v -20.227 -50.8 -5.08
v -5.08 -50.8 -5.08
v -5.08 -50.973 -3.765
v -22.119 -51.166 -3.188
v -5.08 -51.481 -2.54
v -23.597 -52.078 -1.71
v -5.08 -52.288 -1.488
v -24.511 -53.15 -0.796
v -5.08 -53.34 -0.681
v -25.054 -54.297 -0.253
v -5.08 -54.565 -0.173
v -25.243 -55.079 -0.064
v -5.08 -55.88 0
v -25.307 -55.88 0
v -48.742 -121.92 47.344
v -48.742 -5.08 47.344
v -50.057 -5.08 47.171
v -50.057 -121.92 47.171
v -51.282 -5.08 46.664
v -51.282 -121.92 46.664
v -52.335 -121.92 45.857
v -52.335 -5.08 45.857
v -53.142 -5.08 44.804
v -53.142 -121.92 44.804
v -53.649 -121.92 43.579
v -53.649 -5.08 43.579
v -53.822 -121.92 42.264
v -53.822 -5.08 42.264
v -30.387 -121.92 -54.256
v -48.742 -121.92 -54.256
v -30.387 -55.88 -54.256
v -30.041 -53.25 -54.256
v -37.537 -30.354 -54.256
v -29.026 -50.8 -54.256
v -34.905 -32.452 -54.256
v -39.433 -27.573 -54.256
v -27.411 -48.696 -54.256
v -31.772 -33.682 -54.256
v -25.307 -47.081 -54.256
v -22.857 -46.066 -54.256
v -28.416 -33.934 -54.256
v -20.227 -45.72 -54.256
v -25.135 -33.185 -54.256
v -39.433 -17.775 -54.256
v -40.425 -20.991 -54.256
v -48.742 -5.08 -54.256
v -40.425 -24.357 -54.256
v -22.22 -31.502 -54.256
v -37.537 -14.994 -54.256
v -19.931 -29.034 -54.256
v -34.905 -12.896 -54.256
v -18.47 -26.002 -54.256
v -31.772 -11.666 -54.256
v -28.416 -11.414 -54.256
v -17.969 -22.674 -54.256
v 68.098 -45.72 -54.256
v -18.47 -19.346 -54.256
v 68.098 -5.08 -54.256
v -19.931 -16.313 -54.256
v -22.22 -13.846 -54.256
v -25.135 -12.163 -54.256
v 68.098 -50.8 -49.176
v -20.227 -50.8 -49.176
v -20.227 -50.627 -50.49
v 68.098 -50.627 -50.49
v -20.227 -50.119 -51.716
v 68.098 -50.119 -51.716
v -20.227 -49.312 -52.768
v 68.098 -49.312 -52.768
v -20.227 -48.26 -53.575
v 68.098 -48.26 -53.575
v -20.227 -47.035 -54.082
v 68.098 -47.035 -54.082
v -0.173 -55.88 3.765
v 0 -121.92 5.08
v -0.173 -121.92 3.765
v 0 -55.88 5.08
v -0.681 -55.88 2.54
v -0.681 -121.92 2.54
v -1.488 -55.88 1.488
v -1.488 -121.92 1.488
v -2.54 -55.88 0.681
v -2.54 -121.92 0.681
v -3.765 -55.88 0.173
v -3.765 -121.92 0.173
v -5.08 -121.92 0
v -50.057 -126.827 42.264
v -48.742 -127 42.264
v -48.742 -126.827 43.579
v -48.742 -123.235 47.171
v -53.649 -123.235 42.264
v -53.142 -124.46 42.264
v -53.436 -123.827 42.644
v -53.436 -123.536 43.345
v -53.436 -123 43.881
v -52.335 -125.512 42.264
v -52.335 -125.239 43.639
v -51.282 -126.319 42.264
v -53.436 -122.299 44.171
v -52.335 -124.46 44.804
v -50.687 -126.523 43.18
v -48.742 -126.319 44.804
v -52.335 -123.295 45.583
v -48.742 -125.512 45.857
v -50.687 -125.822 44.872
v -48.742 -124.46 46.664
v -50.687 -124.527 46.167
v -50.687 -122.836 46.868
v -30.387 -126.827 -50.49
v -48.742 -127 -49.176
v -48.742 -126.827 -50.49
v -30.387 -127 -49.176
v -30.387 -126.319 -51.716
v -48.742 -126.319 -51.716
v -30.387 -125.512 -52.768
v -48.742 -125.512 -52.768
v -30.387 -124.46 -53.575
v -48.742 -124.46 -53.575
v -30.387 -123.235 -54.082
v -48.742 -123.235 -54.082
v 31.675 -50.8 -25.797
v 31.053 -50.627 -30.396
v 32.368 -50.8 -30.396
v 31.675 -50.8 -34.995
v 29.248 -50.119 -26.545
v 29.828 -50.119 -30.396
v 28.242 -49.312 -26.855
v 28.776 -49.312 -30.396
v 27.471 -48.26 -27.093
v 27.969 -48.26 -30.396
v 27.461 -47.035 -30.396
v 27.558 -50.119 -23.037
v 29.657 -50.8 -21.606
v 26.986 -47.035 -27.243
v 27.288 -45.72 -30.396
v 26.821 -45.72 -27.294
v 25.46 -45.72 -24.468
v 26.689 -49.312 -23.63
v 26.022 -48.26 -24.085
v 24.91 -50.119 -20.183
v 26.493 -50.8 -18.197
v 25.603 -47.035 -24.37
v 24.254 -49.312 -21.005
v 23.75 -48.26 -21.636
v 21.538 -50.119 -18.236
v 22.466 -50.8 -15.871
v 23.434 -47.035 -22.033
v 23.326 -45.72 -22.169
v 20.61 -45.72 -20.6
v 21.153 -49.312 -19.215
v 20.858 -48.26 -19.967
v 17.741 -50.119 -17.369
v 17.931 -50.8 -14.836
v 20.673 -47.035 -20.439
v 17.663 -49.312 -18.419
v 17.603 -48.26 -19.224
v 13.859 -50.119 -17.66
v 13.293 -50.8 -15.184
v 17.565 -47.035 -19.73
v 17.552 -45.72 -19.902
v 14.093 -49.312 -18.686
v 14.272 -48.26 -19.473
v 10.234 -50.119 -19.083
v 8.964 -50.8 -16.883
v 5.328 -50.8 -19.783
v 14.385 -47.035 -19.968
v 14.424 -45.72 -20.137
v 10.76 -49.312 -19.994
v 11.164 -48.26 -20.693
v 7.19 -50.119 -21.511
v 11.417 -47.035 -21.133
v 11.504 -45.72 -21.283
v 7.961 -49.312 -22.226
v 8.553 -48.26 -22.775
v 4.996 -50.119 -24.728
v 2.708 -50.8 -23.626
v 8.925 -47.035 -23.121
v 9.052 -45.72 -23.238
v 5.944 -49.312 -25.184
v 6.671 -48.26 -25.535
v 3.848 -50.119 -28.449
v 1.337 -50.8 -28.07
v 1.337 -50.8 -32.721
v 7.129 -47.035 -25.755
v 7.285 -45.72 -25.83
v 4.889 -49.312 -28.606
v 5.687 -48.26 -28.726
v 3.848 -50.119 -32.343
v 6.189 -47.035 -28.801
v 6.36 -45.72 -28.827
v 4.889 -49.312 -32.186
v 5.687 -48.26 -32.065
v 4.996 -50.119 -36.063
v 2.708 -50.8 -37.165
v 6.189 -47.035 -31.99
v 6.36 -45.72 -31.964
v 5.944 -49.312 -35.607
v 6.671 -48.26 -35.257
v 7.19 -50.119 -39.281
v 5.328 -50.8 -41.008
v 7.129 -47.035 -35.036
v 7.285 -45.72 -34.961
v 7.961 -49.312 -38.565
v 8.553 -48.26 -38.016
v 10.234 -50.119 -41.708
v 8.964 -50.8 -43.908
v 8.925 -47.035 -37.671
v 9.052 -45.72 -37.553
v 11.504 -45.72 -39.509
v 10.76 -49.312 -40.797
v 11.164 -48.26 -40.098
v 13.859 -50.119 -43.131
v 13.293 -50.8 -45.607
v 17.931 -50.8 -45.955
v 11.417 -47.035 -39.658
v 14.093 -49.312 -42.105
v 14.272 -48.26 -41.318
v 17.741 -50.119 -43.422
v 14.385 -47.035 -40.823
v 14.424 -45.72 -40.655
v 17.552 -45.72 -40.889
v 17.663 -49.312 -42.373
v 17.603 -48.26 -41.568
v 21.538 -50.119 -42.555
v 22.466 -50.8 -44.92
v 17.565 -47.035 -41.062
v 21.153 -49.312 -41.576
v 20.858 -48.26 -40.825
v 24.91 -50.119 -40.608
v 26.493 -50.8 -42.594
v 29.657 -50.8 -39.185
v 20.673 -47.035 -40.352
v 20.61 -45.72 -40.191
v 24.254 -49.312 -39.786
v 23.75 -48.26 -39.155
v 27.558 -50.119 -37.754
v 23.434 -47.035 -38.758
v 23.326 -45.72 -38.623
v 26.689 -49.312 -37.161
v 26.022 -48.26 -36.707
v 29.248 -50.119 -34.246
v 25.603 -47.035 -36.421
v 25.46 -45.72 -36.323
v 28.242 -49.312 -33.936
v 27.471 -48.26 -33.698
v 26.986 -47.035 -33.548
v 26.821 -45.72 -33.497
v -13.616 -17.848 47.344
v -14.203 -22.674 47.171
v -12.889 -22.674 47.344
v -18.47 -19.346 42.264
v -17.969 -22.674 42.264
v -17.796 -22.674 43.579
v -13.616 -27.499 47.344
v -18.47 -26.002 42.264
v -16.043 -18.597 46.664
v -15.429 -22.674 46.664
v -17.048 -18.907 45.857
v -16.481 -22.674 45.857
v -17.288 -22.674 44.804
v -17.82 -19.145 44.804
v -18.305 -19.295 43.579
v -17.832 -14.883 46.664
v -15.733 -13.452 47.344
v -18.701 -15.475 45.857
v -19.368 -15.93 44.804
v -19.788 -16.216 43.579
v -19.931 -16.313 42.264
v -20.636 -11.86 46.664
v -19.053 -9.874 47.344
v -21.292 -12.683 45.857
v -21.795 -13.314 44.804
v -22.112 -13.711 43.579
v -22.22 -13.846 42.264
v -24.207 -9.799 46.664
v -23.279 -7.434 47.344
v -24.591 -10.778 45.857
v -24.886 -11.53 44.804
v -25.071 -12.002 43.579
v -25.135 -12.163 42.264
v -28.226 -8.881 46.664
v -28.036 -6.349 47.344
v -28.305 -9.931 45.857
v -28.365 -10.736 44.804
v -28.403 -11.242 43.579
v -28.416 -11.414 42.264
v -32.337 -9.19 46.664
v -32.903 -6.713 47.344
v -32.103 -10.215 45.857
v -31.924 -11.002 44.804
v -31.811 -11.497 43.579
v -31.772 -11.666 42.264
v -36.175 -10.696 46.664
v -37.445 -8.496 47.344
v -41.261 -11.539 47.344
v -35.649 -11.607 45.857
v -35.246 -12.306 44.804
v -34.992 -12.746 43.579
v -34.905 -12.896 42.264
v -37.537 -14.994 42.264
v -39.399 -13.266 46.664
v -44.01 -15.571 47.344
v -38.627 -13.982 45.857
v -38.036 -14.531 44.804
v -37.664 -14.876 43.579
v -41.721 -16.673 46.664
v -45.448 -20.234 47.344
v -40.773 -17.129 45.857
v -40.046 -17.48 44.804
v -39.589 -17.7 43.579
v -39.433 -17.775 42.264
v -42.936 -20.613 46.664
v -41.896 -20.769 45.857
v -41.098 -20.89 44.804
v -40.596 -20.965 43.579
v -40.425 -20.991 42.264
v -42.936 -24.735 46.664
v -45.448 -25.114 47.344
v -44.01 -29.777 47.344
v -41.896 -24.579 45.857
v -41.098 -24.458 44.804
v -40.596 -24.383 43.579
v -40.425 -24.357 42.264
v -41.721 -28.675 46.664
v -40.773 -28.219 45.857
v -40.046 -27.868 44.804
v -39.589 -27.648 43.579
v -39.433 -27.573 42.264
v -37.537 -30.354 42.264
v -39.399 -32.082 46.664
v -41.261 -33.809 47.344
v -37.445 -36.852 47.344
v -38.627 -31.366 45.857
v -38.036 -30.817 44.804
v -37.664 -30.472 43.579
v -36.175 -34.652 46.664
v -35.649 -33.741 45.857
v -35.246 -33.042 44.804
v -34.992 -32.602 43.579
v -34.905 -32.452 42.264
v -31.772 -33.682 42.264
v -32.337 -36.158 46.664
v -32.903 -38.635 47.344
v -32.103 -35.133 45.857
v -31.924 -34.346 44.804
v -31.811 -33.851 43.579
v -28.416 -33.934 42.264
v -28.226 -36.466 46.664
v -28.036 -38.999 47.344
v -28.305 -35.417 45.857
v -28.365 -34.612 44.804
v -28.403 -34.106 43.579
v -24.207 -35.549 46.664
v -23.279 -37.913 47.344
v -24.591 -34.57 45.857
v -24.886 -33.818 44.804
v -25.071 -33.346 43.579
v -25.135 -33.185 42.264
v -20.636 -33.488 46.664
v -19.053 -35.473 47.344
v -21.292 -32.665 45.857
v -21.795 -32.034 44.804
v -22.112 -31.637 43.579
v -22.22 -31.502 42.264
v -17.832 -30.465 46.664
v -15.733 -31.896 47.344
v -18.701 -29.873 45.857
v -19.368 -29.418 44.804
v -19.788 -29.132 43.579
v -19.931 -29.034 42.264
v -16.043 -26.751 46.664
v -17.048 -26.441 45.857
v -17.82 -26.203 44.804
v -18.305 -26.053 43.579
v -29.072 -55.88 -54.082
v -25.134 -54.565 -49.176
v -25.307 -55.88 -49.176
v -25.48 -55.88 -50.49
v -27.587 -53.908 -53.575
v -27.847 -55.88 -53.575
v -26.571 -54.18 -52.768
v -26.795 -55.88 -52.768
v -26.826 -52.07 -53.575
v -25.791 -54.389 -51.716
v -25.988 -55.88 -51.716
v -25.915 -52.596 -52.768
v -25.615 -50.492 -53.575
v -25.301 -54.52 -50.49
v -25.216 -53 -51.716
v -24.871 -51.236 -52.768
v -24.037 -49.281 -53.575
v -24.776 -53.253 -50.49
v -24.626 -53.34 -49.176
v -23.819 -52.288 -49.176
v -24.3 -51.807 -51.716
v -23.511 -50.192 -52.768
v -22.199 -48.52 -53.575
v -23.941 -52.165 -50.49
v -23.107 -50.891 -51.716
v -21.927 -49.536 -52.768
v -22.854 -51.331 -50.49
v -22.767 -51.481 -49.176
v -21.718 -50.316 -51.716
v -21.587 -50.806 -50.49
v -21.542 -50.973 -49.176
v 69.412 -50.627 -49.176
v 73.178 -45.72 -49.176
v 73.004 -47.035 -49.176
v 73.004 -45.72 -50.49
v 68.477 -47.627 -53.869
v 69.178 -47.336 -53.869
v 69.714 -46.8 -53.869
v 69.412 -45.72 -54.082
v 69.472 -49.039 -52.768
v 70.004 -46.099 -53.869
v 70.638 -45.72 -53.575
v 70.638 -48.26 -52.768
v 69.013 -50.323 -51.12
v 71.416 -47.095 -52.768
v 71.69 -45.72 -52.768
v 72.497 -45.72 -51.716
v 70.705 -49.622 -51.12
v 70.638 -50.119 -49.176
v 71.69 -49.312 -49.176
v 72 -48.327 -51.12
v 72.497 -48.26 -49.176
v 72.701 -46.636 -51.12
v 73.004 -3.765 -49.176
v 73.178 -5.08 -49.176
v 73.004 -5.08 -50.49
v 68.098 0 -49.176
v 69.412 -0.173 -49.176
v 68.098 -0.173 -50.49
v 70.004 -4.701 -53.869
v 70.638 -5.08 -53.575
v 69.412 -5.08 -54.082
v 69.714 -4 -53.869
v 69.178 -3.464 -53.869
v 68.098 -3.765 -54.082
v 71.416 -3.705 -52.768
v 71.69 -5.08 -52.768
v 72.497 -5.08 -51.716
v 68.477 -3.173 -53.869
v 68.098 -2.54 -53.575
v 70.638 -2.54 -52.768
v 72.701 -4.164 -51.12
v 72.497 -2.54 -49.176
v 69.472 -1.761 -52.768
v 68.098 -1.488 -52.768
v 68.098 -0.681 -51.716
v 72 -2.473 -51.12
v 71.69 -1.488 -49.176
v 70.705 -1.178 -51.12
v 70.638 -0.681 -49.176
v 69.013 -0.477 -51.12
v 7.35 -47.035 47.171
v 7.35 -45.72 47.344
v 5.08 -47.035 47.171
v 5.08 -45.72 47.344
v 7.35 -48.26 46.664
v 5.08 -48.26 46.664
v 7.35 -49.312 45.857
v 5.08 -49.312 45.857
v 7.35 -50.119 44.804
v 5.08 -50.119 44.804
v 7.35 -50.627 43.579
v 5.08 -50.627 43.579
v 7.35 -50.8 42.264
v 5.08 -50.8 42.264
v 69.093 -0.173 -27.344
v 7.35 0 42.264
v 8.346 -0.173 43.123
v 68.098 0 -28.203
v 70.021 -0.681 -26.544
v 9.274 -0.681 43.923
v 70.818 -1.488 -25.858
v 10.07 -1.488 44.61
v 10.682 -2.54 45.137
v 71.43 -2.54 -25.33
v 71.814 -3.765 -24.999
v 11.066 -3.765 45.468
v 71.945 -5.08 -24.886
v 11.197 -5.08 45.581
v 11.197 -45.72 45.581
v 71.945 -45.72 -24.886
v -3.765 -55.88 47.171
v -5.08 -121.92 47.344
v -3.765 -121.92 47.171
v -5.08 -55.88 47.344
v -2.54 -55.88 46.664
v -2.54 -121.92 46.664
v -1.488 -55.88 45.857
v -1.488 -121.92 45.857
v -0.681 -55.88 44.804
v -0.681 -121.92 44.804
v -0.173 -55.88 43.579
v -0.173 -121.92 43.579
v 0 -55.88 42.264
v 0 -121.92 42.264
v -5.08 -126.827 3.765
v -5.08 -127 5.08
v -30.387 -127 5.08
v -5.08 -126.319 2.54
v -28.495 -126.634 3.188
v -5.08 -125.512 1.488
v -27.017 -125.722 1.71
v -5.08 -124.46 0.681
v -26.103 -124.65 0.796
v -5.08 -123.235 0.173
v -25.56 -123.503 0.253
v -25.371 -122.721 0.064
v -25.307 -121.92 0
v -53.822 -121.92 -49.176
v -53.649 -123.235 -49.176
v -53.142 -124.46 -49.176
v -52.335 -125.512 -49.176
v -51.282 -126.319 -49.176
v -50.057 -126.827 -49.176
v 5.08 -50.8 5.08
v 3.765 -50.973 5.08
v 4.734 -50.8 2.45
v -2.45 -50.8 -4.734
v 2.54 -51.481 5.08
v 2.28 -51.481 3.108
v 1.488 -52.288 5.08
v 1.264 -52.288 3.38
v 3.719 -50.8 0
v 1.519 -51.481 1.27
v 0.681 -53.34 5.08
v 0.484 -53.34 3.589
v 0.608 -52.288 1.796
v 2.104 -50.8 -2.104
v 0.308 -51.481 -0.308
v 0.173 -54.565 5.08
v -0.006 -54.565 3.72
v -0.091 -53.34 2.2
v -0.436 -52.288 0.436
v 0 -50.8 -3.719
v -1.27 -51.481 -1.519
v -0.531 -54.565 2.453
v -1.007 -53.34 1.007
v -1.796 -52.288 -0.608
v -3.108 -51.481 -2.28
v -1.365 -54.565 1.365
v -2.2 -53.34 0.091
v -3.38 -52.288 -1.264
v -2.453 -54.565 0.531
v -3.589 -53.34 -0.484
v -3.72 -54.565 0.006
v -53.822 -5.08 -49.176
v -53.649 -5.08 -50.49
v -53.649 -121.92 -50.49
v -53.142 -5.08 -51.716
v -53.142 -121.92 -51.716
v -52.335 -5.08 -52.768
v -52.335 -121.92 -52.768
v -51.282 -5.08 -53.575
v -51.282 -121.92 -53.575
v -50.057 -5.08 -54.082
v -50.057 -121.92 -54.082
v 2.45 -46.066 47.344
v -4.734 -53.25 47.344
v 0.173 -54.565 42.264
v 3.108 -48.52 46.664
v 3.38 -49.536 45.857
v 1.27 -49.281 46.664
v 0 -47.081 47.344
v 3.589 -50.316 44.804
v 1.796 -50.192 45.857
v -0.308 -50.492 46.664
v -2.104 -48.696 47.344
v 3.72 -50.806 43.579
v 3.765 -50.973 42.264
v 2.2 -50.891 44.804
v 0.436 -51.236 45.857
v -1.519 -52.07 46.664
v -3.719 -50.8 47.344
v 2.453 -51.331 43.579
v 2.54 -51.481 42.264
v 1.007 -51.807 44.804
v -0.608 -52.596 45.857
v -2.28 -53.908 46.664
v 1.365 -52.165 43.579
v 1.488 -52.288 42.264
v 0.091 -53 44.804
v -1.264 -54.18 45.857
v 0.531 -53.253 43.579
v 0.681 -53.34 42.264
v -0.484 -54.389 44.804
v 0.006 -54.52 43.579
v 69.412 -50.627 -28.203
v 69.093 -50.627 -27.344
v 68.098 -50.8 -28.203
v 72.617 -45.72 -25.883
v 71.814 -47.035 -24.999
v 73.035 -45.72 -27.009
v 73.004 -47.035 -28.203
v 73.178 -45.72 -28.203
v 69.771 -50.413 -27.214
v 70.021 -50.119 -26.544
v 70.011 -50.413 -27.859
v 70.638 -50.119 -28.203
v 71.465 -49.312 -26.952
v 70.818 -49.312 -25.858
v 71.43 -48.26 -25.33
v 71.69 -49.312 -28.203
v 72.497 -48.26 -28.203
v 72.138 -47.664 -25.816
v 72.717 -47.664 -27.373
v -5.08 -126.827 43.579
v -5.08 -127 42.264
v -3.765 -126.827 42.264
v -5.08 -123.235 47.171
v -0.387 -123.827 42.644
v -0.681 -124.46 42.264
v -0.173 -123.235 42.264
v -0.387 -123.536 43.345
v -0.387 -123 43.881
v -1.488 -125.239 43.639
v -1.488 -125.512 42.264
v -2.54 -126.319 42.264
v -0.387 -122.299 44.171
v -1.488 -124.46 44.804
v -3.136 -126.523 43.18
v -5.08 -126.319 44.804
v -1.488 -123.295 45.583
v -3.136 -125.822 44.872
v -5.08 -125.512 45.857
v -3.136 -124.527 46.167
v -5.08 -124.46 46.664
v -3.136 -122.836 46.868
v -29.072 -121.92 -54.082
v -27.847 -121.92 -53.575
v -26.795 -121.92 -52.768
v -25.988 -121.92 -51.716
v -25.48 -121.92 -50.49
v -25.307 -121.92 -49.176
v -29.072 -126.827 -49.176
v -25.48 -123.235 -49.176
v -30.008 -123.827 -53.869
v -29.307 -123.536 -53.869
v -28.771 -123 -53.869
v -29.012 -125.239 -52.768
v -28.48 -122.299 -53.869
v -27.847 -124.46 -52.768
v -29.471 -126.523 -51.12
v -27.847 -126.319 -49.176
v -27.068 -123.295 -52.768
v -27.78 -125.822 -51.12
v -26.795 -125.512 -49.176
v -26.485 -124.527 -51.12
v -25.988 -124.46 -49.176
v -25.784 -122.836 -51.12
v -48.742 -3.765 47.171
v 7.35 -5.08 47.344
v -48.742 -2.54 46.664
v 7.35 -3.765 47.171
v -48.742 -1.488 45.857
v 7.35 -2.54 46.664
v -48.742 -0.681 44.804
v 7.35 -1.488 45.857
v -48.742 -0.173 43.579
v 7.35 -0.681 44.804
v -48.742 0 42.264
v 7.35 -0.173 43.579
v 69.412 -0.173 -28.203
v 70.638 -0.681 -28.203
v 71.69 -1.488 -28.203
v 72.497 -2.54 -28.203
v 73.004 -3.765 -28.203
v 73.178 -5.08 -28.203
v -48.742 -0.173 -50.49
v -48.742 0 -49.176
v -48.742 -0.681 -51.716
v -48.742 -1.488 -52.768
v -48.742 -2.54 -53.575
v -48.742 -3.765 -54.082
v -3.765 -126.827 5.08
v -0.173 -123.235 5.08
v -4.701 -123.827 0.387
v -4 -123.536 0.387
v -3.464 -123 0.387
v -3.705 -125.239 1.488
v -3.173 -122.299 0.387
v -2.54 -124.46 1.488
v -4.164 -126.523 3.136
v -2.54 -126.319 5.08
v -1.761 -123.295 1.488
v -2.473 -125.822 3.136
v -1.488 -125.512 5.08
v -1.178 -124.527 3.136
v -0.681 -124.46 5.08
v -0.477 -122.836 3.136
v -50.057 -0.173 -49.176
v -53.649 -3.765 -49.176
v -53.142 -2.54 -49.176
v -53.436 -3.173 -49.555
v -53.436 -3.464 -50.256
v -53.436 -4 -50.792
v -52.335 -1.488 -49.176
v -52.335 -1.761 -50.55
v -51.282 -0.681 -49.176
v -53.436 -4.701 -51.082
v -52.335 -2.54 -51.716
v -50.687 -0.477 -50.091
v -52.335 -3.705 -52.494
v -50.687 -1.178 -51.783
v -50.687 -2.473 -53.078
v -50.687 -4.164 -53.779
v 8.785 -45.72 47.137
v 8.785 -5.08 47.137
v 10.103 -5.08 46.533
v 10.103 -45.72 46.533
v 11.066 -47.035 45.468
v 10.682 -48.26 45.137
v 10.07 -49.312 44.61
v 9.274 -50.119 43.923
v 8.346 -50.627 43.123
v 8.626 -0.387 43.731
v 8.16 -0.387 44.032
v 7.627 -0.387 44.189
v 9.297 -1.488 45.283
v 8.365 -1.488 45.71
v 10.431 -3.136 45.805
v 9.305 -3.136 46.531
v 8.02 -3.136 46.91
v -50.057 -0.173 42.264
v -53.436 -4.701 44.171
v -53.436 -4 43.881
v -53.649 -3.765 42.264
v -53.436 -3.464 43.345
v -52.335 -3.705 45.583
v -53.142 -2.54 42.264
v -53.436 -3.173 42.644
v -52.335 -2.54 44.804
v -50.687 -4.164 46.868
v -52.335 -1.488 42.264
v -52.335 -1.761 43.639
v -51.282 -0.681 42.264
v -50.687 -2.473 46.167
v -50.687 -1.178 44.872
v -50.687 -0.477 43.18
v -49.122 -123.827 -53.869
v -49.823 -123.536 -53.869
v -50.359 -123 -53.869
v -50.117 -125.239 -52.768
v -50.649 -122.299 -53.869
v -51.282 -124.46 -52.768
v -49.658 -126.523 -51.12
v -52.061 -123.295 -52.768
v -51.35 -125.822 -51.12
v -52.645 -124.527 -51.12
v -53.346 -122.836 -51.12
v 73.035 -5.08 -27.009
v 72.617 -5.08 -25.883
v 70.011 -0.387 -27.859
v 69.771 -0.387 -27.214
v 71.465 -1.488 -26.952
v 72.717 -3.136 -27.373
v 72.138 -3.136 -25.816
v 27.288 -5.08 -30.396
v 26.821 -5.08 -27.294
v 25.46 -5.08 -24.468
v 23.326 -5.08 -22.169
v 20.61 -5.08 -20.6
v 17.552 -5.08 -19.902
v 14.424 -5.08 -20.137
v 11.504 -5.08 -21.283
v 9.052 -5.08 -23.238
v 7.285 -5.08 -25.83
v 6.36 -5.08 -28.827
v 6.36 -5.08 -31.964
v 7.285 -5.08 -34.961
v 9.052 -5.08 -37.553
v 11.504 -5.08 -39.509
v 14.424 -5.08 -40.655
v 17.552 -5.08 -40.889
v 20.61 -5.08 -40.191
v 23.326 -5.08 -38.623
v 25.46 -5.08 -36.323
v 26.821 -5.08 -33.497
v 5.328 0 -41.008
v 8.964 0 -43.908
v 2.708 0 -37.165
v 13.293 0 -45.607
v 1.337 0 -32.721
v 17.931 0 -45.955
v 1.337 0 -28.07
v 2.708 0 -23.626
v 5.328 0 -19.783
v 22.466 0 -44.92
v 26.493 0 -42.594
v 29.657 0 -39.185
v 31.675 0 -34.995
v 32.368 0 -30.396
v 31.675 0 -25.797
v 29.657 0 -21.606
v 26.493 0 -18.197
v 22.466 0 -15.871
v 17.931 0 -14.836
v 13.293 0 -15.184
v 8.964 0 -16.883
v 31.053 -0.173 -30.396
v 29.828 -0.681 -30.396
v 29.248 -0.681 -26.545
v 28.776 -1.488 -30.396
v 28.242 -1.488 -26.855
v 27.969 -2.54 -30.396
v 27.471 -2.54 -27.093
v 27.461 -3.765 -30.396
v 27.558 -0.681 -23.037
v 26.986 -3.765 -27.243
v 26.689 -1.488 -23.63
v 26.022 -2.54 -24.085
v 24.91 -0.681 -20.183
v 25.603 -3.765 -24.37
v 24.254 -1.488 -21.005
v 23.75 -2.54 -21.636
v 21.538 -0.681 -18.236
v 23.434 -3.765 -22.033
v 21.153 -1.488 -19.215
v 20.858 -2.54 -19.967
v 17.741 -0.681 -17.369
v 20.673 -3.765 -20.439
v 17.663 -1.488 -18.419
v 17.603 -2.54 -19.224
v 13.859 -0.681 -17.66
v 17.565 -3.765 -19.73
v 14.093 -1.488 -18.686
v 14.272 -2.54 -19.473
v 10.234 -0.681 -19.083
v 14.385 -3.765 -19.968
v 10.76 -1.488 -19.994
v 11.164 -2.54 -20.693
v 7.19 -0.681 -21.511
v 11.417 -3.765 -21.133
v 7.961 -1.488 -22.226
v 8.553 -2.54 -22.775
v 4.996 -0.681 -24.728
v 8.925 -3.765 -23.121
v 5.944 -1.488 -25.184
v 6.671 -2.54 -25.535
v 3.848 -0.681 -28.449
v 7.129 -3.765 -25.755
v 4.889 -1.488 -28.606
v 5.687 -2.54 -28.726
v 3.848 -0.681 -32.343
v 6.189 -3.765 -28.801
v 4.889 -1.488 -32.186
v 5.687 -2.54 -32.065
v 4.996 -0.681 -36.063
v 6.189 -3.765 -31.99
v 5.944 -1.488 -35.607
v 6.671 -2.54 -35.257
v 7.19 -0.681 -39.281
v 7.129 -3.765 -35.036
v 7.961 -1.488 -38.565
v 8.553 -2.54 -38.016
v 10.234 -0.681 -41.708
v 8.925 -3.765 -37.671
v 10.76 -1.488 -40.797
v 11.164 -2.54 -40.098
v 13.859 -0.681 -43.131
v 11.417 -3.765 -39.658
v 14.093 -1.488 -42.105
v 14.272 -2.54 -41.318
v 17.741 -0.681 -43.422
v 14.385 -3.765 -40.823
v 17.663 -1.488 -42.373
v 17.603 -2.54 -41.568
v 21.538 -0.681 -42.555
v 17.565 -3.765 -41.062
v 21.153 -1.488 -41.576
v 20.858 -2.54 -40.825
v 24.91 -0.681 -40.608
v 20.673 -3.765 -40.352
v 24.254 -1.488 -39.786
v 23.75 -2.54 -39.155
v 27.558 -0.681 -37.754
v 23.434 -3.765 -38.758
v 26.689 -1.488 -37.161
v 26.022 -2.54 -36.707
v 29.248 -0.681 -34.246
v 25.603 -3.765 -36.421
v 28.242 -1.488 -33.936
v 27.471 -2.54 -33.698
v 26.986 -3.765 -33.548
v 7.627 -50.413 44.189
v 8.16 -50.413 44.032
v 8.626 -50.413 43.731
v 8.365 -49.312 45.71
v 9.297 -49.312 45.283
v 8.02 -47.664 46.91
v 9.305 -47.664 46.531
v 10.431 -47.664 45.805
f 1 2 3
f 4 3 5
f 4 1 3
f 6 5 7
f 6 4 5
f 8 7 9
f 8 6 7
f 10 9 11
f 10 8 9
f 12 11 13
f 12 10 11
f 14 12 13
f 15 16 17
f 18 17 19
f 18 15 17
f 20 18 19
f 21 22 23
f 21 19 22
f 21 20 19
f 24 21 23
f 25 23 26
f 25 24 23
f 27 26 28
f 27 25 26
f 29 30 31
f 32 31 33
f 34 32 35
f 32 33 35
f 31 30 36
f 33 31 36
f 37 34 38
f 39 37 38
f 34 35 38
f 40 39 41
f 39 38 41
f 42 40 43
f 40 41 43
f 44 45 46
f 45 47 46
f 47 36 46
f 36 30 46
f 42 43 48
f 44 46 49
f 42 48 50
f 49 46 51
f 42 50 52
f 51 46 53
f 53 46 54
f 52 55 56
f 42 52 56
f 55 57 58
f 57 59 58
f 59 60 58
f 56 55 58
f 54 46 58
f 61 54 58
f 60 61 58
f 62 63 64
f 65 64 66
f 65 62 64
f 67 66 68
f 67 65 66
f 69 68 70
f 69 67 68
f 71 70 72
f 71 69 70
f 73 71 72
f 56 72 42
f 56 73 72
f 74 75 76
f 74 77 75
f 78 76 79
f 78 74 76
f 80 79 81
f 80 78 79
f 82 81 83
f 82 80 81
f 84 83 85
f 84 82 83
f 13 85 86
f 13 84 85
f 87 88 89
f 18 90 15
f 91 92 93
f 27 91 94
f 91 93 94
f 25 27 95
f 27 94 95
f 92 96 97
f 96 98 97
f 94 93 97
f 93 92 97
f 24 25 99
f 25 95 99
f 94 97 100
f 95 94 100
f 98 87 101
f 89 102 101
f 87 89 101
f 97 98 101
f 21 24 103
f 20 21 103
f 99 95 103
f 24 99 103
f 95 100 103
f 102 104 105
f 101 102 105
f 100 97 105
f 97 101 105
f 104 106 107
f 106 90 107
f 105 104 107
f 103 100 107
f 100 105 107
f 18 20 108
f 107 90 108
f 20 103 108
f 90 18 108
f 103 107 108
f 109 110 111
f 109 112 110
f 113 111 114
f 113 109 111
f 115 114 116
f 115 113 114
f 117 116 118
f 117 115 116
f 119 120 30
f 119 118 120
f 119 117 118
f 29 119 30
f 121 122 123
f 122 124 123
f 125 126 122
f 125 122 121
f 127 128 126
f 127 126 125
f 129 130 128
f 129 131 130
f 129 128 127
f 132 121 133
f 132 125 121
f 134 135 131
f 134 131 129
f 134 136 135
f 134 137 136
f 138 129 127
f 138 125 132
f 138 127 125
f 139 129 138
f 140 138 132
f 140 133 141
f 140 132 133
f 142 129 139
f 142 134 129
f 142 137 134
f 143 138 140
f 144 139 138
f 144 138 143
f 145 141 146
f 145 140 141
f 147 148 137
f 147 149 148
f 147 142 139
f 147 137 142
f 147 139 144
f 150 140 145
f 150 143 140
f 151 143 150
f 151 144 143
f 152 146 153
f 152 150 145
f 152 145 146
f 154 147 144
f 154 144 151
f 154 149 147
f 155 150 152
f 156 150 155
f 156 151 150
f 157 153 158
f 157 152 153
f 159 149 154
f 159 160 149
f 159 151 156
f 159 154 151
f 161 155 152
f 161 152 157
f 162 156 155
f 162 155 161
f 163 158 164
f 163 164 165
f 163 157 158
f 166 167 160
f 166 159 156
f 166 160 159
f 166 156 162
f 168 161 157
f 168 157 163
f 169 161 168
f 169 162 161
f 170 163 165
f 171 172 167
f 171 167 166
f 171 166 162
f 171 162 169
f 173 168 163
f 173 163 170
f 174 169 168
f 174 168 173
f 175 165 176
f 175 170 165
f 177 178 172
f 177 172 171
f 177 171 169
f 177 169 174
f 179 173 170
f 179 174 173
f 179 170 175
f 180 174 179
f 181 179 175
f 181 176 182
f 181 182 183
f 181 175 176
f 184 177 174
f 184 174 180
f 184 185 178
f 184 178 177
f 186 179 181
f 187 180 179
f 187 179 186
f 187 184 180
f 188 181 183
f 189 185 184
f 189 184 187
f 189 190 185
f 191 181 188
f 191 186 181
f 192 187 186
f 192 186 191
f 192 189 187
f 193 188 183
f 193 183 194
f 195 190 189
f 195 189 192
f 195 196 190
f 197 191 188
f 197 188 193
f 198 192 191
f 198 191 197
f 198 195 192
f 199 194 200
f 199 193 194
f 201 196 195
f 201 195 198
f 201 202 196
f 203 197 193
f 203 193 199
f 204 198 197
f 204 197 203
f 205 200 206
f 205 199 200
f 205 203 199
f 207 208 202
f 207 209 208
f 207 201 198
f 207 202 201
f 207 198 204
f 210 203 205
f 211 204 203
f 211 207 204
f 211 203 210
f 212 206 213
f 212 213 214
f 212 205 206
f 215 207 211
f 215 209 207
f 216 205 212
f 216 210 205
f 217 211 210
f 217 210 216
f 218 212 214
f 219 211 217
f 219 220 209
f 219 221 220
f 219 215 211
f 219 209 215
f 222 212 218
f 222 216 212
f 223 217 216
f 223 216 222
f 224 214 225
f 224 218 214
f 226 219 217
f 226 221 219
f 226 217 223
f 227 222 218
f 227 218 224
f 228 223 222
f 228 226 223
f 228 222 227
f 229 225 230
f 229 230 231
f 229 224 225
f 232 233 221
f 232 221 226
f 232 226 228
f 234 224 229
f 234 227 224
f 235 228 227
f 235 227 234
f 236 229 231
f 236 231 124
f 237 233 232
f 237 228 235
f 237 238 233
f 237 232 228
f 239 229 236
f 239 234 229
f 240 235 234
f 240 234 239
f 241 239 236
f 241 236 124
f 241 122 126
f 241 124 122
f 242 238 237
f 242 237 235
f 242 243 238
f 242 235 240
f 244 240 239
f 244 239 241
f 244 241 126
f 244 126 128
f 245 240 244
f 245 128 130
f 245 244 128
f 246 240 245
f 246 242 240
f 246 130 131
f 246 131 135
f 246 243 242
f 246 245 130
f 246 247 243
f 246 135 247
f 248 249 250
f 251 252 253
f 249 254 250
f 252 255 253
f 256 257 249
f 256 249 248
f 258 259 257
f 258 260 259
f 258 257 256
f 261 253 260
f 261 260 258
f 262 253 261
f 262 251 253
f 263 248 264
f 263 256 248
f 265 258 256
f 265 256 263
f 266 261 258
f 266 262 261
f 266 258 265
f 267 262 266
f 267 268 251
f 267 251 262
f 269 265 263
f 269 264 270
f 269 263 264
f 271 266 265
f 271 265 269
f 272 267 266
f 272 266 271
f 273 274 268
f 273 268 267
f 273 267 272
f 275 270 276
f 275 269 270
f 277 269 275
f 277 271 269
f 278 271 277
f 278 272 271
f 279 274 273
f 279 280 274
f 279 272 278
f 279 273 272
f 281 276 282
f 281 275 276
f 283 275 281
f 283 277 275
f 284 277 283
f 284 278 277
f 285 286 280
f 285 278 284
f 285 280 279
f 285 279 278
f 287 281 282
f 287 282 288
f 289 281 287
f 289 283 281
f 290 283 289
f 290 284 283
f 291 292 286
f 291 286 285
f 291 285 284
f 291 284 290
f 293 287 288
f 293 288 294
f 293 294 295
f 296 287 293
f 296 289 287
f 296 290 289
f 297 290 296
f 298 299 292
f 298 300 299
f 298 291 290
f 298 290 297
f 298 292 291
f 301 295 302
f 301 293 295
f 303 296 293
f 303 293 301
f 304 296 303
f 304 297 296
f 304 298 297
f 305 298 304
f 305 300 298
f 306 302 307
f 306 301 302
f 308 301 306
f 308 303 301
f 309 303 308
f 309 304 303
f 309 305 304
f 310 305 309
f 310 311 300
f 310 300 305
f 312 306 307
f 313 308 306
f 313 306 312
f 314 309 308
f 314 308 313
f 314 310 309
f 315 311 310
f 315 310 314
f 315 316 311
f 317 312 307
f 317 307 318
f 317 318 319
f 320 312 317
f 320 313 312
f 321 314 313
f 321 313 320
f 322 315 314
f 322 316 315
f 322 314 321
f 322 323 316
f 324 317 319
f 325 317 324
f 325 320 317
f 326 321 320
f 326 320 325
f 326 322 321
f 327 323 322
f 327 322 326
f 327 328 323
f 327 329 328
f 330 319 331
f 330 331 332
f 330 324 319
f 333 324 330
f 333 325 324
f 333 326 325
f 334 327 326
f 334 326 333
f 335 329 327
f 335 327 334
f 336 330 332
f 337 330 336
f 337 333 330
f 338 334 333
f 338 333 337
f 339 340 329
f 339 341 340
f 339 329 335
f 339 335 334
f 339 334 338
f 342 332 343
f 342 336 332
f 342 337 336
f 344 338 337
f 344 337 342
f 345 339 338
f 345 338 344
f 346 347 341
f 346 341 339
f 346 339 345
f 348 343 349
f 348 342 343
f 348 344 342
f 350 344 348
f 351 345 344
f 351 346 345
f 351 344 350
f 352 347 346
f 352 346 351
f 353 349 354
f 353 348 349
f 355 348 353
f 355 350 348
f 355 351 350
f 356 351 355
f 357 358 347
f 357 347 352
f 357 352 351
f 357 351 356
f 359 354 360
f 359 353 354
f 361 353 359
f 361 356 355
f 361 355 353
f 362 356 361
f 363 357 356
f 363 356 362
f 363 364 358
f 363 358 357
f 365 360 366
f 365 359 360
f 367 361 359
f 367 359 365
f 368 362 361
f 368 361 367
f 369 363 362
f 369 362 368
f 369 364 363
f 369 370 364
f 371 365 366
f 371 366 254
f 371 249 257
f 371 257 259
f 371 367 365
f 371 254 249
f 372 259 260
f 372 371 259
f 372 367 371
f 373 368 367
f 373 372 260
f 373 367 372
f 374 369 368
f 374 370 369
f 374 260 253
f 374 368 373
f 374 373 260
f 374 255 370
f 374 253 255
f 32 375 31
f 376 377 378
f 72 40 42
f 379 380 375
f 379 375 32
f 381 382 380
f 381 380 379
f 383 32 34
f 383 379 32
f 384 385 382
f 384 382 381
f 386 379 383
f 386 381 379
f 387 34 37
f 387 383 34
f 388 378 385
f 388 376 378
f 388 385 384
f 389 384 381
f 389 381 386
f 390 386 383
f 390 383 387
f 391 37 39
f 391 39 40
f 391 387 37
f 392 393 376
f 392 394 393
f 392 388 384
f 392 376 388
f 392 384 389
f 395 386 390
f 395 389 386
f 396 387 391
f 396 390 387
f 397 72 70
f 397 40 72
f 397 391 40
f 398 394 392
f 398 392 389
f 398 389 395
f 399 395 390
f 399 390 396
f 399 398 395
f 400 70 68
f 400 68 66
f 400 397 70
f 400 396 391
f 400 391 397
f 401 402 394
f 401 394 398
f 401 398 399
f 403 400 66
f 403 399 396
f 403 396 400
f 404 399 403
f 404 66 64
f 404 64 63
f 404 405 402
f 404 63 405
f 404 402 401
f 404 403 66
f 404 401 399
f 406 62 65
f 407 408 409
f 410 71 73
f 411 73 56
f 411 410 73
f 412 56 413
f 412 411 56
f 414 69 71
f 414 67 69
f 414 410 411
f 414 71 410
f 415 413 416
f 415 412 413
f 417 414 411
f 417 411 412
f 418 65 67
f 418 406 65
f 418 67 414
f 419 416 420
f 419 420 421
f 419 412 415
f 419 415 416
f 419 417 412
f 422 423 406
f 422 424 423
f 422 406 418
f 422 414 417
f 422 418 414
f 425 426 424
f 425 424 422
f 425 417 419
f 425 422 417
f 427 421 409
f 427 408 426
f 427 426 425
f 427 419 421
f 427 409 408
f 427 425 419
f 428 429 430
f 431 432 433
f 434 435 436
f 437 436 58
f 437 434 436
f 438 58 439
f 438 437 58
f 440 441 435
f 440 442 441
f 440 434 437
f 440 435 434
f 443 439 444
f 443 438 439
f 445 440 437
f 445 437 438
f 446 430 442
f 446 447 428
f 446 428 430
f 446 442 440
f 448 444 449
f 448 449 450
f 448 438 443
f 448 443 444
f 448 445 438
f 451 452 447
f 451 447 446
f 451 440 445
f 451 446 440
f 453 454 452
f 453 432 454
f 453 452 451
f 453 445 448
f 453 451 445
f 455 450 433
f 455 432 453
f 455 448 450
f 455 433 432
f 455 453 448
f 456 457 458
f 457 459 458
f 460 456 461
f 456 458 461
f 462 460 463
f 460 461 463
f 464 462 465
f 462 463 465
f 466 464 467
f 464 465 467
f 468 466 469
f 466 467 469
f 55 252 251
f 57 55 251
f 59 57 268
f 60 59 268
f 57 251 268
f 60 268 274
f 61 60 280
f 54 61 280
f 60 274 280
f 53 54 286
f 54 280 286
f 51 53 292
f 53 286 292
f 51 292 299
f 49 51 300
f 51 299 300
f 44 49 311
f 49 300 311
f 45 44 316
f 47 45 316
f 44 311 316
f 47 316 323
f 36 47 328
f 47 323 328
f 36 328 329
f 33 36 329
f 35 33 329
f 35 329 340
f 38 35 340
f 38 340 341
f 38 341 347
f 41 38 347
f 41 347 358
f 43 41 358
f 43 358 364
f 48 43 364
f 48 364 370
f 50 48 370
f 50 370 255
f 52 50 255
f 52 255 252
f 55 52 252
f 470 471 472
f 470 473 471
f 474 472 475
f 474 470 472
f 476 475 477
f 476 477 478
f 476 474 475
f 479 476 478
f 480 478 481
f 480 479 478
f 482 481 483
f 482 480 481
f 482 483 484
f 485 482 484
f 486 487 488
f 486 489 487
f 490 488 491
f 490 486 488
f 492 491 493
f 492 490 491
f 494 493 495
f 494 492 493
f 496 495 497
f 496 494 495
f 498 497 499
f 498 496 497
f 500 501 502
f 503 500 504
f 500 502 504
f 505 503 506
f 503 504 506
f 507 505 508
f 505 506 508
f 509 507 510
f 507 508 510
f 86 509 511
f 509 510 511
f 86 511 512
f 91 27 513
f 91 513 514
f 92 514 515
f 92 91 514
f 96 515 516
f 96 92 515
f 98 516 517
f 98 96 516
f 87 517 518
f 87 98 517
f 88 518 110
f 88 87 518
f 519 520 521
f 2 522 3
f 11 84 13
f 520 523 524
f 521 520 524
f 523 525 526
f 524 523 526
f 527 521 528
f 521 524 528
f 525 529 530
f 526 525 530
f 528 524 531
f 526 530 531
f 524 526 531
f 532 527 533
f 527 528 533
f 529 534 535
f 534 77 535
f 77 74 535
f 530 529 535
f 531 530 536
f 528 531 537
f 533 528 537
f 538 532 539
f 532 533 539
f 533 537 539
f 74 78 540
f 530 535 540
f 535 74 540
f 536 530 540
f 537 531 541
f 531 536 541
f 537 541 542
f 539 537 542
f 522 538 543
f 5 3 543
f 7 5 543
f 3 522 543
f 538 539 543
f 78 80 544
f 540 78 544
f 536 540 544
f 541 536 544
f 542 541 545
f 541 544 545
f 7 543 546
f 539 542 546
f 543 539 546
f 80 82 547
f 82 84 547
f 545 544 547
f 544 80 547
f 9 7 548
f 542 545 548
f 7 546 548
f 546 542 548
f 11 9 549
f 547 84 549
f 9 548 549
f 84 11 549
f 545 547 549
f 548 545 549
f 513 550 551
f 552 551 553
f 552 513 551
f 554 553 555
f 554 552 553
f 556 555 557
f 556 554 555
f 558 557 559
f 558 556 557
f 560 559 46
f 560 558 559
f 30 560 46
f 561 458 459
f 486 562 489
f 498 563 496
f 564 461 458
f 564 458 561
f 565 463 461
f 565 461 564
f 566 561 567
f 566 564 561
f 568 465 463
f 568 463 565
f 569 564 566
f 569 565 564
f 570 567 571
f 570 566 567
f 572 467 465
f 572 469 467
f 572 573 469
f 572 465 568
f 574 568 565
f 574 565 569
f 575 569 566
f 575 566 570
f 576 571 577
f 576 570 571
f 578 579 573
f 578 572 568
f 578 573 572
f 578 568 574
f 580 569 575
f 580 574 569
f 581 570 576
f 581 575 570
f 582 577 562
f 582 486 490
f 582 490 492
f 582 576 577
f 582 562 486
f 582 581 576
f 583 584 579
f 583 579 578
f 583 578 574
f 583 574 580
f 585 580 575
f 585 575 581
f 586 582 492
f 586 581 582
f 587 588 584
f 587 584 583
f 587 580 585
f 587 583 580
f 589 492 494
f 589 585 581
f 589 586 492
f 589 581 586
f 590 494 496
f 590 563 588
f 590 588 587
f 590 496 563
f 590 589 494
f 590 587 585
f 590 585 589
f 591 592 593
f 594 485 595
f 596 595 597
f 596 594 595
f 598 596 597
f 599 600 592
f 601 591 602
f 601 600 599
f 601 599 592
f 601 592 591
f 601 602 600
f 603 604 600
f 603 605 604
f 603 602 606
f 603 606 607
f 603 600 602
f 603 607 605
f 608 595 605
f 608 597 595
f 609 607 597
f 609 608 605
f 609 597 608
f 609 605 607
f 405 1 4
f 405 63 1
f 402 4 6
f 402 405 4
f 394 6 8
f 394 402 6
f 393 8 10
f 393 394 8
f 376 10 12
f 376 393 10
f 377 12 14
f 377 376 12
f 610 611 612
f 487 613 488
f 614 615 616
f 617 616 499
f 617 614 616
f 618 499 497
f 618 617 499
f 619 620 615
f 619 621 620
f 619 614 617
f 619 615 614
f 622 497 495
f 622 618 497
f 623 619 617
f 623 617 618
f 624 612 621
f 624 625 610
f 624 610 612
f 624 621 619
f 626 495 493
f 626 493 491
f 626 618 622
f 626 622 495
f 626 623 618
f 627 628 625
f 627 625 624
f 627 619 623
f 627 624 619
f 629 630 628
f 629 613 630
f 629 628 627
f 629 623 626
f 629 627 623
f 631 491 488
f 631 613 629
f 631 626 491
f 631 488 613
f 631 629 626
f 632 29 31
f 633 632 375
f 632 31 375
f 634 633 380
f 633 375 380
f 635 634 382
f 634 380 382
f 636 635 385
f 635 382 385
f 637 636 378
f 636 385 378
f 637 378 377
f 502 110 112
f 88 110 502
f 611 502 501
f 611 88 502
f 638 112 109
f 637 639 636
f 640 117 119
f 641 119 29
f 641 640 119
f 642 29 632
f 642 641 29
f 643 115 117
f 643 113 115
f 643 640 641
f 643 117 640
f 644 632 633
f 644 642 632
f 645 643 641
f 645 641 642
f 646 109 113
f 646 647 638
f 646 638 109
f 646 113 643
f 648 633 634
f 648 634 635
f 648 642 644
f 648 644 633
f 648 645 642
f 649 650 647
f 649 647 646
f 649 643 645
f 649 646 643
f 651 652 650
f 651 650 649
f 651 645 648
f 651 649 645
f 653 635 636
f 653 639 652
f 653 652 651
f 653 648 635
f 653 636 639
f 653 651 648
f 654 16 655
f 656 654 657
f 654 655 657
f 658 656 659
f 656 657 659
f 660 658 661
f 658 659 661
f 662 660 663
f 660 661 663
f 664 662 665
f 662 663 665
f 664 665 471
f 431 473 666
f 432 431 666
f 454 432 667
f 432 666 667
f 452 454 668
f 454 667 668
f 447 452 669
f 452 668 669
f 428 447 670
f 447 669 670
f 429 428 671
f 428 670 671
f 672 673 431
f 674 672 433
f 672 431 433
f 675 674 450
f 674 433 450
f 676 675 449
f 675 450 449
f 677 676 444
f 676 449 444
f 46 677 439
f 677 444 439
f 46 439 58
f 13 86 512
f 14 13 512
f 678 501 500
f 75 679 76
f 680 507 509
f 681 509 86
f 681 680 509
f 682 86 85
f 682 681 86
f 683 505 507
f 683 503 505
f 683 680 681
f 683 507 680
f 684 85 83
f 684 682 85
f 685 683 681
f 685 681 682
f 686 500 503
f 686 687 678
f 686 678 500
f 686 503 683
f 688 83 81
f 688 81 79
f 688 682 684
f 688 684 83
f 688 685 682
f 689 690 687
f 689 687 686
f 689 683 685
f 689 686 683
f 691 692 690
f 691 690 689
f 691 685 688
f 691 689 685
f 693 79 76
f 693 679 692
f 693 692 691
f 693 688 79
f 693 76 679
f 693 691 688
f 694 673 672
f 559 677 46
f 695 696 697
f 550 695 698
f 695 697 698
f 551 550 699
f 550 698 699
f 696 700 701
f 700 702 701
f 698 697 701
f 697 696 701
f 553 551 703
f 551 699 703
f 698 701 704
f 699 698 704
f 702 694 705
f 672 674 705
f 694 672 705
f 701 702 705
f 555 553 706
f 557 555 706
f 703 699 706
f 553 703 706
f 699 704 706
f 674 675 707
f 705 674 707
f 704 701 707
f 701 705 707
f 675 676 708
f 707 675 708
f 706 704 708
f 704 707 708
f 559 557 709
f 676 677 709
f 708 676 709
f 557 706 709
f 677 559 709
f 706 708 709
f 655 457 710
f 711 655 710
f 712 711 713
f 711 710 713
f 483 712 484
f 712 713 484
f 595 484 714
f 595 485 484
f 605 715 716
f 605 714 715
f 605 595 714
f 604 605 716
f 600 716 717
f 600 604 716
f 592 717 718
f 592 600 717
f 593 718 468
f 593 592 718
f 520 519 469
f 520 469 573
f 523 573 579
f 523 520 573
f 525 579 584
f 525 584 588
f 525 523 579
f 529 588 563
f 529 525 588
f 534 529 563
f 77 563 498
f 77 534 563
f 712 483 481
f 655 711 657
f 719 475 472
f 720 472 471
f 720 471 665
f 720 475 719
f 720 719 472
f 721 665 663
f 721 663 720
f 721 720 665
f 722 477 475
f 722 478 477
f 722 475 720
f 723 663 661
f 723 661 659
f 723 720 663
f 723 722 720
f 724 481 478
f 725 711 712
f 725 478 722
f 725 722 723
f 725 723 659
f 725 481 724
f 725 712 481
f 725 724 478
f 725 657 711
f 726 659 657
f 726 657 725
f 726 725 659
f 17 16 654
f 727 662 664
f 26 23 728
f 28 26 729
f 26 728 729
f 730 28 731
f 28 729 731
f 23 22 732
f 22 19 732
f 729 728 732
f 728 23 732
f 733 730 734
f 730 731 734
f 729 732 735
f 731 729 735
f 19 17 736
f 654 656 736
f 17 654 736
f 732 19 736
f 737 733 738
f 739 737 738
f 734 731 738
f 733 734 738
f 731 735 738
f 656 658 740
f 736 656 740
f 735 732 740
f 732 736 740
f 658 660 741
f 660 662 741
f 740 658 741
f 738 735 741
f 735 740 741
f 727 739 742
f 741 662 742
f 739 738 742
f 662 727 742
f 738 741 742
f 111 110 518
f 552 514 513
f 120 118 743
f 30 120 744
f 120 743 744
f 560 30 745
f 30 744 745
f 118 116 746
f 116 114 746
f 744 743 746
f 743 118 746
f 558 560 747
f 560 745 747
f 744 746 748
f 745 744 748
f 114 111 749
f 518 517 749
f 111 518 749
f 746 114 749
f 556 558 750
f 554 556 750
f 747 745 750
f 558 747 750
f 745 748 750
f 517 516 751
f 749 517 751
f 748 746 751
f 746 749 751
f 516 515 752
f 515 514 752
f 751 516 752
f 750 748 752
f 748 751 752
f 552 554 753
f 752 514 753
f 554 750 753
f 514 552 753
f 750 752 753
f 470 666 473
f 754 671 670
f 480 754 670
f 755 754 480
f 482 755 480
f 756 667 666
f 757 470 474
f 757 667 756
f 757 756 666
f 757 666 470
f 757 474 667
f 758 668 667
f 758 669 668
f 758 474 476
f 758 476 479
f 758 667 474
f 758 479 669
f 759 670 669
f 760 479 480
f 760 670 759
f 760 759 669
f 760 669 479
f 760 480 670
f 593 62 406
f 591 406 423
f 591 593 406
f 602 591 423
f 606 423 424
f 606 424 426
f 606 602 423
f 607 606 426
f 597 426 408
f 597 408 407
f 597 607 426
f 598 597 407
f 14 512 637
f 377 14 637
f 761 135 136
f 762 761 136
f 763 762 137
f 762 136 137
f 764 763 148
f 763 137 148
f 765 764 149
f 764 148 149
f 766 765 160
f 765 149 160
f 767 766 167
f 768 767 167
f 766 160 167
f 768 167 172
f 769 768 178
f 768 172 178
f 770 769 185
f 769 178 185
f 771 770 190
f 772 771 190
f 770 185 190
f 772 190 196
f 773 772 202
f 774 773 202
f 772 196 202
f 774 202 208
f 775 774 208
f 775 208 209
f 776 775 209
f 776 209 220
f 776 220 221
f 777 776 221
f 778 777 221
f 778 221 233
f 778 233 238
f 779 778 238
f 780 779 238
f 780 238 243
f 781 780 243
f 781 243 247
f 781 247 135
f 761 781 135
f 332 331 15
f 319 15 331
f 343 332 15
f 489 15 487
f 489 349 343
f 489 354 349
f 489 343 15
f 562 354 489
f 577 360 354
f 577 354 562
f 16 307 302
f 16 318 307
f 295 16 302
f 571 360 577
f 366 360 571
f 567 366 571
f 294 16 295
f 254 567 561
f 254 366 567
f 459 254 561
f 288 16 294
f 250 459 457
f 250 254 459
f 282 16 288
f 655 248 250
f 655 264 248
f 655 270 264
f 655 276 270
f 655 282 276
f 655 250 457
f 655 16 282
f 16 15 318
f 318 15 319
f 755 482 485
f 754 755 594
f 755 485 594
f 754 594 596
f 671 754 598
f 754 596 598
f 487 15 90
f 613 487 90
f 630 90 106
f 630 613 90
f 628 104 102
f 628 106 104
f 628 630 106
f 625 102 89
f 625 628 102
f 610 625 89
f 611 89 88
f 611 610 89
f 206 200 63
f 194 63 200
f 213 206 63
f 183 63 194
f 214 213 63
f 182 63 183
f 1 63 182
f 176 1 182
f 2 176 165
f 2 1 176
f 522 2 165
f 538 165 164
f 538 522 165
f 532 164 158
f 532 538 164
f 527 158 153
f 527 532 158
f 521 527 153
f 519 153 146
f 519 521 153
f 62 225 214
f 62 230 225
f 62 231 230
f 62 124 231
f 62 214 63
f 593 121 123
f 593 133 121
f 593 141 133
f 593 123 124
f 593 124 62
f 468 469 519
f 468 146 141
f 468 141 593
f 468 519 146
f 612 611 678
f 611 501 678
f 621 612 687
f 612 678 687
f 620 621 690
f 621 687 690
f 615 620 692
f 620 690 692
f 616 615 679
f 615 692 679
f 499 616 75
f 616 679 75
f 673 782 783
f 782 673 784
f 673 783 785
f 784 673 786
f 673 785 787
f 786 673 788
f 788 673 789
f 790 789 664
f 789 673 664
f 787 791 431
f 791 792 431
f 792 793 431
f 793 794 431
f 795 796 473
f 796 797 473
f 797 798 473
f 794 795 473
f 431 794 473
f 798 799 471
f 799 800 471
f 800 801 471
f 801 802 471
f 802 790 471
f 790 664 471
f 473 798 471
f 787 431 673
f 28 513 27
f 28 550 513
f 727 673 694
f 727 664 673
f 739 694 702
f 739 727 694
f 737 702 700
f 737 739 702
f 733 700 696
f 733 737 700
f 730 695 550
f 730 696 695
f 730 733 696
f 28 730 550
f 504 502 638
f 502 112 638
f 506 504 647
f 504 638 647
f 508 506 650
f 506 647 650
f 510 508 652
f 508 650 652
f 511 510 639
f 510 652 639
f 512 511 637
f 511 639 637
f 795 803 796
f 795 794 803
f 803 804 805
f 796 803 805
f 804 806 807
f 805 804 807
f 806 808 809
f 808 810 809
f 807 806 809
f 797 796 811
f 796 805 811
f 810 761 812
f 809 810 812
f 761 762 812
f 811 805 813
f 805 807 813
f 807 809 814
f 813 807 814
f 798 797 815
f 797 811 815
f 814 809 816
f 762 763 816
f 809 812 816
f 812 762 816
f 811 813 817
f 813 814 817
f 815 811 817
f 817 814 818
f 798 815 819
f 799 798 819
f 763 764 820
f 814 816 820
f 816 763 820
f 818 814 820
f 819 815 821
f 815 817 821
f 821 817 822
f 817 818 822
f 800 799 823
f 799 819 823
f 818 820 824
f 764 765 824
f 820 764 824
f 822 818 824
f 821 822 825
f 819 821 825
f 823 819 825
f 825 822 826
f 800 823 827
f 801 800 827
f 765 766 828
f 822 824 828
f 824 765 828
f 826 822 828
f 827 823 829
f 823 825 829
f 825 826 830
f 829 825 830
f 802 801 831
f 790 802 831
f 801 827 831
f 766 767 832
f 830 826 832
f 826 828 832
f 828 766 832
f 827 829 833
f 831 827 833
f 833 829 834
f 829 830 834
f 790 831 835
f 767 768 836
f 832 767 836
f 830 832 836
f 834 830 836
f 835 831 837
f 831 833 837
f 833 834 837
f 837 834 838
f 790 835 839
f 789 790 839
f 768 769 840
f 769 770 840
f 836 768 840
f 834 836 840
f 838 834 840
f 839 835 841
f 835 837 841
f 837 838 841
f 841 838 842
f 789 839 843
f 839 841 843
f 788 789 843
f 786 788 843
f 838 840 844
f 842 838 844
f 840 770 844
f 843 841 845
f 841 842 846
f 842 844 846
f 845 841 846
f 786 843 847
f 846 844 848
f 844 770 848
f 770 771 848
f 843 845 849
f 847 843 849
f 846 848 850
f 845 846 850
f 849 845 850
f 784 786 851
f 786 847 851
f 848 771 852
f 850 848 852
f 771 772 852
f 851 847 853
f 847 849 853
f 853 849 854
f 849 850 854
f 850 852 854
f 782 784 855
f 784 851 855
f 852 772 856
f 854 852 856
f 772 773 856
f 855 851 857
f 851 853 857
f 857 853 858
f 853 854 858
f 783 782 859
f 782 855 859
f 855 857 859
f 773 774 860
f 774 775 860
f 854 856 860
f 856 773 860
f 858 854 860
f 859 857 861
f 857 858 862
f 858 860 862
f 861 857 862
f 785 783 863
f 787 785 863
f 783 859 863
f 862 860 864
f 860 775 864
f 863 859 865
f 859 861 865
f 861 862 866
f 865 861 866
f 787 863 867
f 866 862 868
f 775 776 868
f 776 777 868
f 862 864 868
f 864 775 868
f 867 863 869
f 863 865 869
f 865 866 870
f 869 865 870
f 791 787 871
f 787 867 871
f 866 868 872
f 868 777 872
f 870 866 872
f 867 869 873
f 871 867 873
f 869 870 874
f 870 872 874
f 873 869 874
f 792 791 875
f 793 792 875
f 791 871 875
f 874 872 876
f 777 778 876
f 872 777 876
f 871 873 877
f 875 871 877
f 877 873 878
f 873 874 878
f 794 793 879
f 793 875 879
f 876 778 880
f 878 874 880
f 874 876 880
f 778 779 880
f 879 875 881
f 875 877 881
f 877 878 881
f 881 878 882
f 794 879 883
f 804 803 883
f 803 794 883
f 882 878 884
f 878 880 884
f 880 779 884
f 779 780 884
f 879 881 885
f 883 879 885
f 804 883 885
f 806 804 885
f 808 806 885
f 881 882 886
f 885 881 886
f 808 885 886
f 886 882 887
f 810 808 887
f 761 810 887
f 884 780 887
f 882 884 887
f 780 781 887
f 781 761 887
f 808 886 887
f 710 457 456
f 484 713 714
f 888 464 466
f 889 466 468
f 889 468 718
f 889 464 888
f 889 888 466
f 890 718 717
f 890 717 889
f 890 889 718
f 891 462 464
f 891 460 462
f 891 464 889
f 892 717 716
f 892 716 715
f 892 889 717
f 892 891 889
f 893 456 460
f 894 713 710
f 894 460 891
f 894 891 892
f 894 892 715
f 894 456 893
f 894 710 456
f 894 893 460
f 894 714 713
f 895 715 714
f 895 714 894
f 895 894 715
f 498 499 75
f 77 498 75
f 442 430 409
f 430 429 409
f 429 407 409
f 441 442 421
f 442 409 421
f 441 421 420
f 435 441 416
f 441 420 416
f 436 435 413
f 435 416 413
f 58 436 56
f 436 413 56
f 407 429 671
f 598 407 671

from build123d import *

# Parameters (mm, degrees)
F0_W     = 127
F0_H     = 101.6
F1_DEPTH = 127
F3_DEPTH = 76.2
F4_R     = 10.5227523194
F5_DEPTH = 50.801
F6_R     = 11.2911618422
F7_DEPTH = 101.601
F8_SIZE2 = 73.66
F8_SIZE  = 63.5
F9_R     = 5.08


with BuildPart() as f1:
    # F0 (on Front) → F1 (new body)
    with BuildSketch(Plane.XZ):
        with Locations((9.6775274724, -3.4555412512)):
            Rectangle(F0_W, F0_H)
    extrude(amount=F1_DEPTH)

    # F2 (on face) → F3 (cut)
    with BuildSketch(Plane.XZ.offset(127)):
        Polygon((73.1775274724, 47.3444587488), (0, 47.3444587488), (0, 0), (-25.3069717437, 0), (-25.3069717437, -54.2555412512), (73.1775274724, -54.2555412512), align=None)
    extrude(amount=-F3_DEPTH, mode=Mode.SUBTRACT)

    # F4 (on face) → F5 (cut, through all)
    with BuildSketch(Plane.XZ.offset(50.8)):
        with Locations((16.7653001845, -30.3956214339)):
            Circle(F4_R)
    extrude(amount=-F5_DEPTH, mode=Mode.SUBTRACT)

    # F6 (on face) → F7 (cut, through all)
    with BuildSketch(Plane.XY.offset(47.3444587488)):
        with Locations((-29.2597617954, -22.6739365608)):
            Circle(F6_R)
    extrude(amount=-F7_DEPTH, mode=Mode.SUBTRACT)

    # F8
    f8_edges = [f1.edges().sort_by_distance(p)[0] for p in [
        (73.177527, -25.4, 47.344459),
    ]]
    f8_side = f1.faces().sort_by_distance((-3.567211, -51.159815, 47.344459))[0]
    chamfer(f8_edges, length=F8_SIZE, length2=F8_SIZE2, reference=f8_side)

    # F9
    f9_edges = [f1.edges().sort_by_distance(p)[0] for p in [
        (-26.911236, -127, 47.344459),
        (-53.822473, -127, -3.455541),
        (0, -127, 23.672229),
        (-12.653486, -127, 0),
        (-25.306972, -127, -27.127771),
        (-39.564722, -127, -54.255541),
        (0, -88.9, 47.344459),
        (0, -88.9, 0),
        (0, -50.8, 23.672229),
        (-22.072473, 0, 47.344459),
        (9.677527, -25.4, 47.344459),
        (-53.822473, -63.5, 47.344459),
        (4.838764, -50.8, 47.344459),
        (-40.550924, -22.673937, 47.344459),
        (41.427527, 0, 10.514459),
        (73.177527, -25.4, -26.315541),
        (41.427527, -50.8, 10.514459),
        (73.177527, -50.8, -40.285541),
        (-12.653486, -50.8, 0),
        (23.935278, -50.8, -54.255541),
        (-25.306972, -50.8, -27.127771),
        (6.242548, -50.8, -30.395621),
        (73.177527, 0, -40.285541),
        (73.177527, -25.4, -54.255541),
        (9.677527, 0, -54.255541),
        (-53.822473, 0, -3.455541),
        (6.242548, 0, -30.395621),
        (-53.822473, -63.5, -54.255541),
        (-25.306972, -88.9, -54.255541),
    ]]
    fillet(f9_edges, radius=F9_R)


solid = f1.part
